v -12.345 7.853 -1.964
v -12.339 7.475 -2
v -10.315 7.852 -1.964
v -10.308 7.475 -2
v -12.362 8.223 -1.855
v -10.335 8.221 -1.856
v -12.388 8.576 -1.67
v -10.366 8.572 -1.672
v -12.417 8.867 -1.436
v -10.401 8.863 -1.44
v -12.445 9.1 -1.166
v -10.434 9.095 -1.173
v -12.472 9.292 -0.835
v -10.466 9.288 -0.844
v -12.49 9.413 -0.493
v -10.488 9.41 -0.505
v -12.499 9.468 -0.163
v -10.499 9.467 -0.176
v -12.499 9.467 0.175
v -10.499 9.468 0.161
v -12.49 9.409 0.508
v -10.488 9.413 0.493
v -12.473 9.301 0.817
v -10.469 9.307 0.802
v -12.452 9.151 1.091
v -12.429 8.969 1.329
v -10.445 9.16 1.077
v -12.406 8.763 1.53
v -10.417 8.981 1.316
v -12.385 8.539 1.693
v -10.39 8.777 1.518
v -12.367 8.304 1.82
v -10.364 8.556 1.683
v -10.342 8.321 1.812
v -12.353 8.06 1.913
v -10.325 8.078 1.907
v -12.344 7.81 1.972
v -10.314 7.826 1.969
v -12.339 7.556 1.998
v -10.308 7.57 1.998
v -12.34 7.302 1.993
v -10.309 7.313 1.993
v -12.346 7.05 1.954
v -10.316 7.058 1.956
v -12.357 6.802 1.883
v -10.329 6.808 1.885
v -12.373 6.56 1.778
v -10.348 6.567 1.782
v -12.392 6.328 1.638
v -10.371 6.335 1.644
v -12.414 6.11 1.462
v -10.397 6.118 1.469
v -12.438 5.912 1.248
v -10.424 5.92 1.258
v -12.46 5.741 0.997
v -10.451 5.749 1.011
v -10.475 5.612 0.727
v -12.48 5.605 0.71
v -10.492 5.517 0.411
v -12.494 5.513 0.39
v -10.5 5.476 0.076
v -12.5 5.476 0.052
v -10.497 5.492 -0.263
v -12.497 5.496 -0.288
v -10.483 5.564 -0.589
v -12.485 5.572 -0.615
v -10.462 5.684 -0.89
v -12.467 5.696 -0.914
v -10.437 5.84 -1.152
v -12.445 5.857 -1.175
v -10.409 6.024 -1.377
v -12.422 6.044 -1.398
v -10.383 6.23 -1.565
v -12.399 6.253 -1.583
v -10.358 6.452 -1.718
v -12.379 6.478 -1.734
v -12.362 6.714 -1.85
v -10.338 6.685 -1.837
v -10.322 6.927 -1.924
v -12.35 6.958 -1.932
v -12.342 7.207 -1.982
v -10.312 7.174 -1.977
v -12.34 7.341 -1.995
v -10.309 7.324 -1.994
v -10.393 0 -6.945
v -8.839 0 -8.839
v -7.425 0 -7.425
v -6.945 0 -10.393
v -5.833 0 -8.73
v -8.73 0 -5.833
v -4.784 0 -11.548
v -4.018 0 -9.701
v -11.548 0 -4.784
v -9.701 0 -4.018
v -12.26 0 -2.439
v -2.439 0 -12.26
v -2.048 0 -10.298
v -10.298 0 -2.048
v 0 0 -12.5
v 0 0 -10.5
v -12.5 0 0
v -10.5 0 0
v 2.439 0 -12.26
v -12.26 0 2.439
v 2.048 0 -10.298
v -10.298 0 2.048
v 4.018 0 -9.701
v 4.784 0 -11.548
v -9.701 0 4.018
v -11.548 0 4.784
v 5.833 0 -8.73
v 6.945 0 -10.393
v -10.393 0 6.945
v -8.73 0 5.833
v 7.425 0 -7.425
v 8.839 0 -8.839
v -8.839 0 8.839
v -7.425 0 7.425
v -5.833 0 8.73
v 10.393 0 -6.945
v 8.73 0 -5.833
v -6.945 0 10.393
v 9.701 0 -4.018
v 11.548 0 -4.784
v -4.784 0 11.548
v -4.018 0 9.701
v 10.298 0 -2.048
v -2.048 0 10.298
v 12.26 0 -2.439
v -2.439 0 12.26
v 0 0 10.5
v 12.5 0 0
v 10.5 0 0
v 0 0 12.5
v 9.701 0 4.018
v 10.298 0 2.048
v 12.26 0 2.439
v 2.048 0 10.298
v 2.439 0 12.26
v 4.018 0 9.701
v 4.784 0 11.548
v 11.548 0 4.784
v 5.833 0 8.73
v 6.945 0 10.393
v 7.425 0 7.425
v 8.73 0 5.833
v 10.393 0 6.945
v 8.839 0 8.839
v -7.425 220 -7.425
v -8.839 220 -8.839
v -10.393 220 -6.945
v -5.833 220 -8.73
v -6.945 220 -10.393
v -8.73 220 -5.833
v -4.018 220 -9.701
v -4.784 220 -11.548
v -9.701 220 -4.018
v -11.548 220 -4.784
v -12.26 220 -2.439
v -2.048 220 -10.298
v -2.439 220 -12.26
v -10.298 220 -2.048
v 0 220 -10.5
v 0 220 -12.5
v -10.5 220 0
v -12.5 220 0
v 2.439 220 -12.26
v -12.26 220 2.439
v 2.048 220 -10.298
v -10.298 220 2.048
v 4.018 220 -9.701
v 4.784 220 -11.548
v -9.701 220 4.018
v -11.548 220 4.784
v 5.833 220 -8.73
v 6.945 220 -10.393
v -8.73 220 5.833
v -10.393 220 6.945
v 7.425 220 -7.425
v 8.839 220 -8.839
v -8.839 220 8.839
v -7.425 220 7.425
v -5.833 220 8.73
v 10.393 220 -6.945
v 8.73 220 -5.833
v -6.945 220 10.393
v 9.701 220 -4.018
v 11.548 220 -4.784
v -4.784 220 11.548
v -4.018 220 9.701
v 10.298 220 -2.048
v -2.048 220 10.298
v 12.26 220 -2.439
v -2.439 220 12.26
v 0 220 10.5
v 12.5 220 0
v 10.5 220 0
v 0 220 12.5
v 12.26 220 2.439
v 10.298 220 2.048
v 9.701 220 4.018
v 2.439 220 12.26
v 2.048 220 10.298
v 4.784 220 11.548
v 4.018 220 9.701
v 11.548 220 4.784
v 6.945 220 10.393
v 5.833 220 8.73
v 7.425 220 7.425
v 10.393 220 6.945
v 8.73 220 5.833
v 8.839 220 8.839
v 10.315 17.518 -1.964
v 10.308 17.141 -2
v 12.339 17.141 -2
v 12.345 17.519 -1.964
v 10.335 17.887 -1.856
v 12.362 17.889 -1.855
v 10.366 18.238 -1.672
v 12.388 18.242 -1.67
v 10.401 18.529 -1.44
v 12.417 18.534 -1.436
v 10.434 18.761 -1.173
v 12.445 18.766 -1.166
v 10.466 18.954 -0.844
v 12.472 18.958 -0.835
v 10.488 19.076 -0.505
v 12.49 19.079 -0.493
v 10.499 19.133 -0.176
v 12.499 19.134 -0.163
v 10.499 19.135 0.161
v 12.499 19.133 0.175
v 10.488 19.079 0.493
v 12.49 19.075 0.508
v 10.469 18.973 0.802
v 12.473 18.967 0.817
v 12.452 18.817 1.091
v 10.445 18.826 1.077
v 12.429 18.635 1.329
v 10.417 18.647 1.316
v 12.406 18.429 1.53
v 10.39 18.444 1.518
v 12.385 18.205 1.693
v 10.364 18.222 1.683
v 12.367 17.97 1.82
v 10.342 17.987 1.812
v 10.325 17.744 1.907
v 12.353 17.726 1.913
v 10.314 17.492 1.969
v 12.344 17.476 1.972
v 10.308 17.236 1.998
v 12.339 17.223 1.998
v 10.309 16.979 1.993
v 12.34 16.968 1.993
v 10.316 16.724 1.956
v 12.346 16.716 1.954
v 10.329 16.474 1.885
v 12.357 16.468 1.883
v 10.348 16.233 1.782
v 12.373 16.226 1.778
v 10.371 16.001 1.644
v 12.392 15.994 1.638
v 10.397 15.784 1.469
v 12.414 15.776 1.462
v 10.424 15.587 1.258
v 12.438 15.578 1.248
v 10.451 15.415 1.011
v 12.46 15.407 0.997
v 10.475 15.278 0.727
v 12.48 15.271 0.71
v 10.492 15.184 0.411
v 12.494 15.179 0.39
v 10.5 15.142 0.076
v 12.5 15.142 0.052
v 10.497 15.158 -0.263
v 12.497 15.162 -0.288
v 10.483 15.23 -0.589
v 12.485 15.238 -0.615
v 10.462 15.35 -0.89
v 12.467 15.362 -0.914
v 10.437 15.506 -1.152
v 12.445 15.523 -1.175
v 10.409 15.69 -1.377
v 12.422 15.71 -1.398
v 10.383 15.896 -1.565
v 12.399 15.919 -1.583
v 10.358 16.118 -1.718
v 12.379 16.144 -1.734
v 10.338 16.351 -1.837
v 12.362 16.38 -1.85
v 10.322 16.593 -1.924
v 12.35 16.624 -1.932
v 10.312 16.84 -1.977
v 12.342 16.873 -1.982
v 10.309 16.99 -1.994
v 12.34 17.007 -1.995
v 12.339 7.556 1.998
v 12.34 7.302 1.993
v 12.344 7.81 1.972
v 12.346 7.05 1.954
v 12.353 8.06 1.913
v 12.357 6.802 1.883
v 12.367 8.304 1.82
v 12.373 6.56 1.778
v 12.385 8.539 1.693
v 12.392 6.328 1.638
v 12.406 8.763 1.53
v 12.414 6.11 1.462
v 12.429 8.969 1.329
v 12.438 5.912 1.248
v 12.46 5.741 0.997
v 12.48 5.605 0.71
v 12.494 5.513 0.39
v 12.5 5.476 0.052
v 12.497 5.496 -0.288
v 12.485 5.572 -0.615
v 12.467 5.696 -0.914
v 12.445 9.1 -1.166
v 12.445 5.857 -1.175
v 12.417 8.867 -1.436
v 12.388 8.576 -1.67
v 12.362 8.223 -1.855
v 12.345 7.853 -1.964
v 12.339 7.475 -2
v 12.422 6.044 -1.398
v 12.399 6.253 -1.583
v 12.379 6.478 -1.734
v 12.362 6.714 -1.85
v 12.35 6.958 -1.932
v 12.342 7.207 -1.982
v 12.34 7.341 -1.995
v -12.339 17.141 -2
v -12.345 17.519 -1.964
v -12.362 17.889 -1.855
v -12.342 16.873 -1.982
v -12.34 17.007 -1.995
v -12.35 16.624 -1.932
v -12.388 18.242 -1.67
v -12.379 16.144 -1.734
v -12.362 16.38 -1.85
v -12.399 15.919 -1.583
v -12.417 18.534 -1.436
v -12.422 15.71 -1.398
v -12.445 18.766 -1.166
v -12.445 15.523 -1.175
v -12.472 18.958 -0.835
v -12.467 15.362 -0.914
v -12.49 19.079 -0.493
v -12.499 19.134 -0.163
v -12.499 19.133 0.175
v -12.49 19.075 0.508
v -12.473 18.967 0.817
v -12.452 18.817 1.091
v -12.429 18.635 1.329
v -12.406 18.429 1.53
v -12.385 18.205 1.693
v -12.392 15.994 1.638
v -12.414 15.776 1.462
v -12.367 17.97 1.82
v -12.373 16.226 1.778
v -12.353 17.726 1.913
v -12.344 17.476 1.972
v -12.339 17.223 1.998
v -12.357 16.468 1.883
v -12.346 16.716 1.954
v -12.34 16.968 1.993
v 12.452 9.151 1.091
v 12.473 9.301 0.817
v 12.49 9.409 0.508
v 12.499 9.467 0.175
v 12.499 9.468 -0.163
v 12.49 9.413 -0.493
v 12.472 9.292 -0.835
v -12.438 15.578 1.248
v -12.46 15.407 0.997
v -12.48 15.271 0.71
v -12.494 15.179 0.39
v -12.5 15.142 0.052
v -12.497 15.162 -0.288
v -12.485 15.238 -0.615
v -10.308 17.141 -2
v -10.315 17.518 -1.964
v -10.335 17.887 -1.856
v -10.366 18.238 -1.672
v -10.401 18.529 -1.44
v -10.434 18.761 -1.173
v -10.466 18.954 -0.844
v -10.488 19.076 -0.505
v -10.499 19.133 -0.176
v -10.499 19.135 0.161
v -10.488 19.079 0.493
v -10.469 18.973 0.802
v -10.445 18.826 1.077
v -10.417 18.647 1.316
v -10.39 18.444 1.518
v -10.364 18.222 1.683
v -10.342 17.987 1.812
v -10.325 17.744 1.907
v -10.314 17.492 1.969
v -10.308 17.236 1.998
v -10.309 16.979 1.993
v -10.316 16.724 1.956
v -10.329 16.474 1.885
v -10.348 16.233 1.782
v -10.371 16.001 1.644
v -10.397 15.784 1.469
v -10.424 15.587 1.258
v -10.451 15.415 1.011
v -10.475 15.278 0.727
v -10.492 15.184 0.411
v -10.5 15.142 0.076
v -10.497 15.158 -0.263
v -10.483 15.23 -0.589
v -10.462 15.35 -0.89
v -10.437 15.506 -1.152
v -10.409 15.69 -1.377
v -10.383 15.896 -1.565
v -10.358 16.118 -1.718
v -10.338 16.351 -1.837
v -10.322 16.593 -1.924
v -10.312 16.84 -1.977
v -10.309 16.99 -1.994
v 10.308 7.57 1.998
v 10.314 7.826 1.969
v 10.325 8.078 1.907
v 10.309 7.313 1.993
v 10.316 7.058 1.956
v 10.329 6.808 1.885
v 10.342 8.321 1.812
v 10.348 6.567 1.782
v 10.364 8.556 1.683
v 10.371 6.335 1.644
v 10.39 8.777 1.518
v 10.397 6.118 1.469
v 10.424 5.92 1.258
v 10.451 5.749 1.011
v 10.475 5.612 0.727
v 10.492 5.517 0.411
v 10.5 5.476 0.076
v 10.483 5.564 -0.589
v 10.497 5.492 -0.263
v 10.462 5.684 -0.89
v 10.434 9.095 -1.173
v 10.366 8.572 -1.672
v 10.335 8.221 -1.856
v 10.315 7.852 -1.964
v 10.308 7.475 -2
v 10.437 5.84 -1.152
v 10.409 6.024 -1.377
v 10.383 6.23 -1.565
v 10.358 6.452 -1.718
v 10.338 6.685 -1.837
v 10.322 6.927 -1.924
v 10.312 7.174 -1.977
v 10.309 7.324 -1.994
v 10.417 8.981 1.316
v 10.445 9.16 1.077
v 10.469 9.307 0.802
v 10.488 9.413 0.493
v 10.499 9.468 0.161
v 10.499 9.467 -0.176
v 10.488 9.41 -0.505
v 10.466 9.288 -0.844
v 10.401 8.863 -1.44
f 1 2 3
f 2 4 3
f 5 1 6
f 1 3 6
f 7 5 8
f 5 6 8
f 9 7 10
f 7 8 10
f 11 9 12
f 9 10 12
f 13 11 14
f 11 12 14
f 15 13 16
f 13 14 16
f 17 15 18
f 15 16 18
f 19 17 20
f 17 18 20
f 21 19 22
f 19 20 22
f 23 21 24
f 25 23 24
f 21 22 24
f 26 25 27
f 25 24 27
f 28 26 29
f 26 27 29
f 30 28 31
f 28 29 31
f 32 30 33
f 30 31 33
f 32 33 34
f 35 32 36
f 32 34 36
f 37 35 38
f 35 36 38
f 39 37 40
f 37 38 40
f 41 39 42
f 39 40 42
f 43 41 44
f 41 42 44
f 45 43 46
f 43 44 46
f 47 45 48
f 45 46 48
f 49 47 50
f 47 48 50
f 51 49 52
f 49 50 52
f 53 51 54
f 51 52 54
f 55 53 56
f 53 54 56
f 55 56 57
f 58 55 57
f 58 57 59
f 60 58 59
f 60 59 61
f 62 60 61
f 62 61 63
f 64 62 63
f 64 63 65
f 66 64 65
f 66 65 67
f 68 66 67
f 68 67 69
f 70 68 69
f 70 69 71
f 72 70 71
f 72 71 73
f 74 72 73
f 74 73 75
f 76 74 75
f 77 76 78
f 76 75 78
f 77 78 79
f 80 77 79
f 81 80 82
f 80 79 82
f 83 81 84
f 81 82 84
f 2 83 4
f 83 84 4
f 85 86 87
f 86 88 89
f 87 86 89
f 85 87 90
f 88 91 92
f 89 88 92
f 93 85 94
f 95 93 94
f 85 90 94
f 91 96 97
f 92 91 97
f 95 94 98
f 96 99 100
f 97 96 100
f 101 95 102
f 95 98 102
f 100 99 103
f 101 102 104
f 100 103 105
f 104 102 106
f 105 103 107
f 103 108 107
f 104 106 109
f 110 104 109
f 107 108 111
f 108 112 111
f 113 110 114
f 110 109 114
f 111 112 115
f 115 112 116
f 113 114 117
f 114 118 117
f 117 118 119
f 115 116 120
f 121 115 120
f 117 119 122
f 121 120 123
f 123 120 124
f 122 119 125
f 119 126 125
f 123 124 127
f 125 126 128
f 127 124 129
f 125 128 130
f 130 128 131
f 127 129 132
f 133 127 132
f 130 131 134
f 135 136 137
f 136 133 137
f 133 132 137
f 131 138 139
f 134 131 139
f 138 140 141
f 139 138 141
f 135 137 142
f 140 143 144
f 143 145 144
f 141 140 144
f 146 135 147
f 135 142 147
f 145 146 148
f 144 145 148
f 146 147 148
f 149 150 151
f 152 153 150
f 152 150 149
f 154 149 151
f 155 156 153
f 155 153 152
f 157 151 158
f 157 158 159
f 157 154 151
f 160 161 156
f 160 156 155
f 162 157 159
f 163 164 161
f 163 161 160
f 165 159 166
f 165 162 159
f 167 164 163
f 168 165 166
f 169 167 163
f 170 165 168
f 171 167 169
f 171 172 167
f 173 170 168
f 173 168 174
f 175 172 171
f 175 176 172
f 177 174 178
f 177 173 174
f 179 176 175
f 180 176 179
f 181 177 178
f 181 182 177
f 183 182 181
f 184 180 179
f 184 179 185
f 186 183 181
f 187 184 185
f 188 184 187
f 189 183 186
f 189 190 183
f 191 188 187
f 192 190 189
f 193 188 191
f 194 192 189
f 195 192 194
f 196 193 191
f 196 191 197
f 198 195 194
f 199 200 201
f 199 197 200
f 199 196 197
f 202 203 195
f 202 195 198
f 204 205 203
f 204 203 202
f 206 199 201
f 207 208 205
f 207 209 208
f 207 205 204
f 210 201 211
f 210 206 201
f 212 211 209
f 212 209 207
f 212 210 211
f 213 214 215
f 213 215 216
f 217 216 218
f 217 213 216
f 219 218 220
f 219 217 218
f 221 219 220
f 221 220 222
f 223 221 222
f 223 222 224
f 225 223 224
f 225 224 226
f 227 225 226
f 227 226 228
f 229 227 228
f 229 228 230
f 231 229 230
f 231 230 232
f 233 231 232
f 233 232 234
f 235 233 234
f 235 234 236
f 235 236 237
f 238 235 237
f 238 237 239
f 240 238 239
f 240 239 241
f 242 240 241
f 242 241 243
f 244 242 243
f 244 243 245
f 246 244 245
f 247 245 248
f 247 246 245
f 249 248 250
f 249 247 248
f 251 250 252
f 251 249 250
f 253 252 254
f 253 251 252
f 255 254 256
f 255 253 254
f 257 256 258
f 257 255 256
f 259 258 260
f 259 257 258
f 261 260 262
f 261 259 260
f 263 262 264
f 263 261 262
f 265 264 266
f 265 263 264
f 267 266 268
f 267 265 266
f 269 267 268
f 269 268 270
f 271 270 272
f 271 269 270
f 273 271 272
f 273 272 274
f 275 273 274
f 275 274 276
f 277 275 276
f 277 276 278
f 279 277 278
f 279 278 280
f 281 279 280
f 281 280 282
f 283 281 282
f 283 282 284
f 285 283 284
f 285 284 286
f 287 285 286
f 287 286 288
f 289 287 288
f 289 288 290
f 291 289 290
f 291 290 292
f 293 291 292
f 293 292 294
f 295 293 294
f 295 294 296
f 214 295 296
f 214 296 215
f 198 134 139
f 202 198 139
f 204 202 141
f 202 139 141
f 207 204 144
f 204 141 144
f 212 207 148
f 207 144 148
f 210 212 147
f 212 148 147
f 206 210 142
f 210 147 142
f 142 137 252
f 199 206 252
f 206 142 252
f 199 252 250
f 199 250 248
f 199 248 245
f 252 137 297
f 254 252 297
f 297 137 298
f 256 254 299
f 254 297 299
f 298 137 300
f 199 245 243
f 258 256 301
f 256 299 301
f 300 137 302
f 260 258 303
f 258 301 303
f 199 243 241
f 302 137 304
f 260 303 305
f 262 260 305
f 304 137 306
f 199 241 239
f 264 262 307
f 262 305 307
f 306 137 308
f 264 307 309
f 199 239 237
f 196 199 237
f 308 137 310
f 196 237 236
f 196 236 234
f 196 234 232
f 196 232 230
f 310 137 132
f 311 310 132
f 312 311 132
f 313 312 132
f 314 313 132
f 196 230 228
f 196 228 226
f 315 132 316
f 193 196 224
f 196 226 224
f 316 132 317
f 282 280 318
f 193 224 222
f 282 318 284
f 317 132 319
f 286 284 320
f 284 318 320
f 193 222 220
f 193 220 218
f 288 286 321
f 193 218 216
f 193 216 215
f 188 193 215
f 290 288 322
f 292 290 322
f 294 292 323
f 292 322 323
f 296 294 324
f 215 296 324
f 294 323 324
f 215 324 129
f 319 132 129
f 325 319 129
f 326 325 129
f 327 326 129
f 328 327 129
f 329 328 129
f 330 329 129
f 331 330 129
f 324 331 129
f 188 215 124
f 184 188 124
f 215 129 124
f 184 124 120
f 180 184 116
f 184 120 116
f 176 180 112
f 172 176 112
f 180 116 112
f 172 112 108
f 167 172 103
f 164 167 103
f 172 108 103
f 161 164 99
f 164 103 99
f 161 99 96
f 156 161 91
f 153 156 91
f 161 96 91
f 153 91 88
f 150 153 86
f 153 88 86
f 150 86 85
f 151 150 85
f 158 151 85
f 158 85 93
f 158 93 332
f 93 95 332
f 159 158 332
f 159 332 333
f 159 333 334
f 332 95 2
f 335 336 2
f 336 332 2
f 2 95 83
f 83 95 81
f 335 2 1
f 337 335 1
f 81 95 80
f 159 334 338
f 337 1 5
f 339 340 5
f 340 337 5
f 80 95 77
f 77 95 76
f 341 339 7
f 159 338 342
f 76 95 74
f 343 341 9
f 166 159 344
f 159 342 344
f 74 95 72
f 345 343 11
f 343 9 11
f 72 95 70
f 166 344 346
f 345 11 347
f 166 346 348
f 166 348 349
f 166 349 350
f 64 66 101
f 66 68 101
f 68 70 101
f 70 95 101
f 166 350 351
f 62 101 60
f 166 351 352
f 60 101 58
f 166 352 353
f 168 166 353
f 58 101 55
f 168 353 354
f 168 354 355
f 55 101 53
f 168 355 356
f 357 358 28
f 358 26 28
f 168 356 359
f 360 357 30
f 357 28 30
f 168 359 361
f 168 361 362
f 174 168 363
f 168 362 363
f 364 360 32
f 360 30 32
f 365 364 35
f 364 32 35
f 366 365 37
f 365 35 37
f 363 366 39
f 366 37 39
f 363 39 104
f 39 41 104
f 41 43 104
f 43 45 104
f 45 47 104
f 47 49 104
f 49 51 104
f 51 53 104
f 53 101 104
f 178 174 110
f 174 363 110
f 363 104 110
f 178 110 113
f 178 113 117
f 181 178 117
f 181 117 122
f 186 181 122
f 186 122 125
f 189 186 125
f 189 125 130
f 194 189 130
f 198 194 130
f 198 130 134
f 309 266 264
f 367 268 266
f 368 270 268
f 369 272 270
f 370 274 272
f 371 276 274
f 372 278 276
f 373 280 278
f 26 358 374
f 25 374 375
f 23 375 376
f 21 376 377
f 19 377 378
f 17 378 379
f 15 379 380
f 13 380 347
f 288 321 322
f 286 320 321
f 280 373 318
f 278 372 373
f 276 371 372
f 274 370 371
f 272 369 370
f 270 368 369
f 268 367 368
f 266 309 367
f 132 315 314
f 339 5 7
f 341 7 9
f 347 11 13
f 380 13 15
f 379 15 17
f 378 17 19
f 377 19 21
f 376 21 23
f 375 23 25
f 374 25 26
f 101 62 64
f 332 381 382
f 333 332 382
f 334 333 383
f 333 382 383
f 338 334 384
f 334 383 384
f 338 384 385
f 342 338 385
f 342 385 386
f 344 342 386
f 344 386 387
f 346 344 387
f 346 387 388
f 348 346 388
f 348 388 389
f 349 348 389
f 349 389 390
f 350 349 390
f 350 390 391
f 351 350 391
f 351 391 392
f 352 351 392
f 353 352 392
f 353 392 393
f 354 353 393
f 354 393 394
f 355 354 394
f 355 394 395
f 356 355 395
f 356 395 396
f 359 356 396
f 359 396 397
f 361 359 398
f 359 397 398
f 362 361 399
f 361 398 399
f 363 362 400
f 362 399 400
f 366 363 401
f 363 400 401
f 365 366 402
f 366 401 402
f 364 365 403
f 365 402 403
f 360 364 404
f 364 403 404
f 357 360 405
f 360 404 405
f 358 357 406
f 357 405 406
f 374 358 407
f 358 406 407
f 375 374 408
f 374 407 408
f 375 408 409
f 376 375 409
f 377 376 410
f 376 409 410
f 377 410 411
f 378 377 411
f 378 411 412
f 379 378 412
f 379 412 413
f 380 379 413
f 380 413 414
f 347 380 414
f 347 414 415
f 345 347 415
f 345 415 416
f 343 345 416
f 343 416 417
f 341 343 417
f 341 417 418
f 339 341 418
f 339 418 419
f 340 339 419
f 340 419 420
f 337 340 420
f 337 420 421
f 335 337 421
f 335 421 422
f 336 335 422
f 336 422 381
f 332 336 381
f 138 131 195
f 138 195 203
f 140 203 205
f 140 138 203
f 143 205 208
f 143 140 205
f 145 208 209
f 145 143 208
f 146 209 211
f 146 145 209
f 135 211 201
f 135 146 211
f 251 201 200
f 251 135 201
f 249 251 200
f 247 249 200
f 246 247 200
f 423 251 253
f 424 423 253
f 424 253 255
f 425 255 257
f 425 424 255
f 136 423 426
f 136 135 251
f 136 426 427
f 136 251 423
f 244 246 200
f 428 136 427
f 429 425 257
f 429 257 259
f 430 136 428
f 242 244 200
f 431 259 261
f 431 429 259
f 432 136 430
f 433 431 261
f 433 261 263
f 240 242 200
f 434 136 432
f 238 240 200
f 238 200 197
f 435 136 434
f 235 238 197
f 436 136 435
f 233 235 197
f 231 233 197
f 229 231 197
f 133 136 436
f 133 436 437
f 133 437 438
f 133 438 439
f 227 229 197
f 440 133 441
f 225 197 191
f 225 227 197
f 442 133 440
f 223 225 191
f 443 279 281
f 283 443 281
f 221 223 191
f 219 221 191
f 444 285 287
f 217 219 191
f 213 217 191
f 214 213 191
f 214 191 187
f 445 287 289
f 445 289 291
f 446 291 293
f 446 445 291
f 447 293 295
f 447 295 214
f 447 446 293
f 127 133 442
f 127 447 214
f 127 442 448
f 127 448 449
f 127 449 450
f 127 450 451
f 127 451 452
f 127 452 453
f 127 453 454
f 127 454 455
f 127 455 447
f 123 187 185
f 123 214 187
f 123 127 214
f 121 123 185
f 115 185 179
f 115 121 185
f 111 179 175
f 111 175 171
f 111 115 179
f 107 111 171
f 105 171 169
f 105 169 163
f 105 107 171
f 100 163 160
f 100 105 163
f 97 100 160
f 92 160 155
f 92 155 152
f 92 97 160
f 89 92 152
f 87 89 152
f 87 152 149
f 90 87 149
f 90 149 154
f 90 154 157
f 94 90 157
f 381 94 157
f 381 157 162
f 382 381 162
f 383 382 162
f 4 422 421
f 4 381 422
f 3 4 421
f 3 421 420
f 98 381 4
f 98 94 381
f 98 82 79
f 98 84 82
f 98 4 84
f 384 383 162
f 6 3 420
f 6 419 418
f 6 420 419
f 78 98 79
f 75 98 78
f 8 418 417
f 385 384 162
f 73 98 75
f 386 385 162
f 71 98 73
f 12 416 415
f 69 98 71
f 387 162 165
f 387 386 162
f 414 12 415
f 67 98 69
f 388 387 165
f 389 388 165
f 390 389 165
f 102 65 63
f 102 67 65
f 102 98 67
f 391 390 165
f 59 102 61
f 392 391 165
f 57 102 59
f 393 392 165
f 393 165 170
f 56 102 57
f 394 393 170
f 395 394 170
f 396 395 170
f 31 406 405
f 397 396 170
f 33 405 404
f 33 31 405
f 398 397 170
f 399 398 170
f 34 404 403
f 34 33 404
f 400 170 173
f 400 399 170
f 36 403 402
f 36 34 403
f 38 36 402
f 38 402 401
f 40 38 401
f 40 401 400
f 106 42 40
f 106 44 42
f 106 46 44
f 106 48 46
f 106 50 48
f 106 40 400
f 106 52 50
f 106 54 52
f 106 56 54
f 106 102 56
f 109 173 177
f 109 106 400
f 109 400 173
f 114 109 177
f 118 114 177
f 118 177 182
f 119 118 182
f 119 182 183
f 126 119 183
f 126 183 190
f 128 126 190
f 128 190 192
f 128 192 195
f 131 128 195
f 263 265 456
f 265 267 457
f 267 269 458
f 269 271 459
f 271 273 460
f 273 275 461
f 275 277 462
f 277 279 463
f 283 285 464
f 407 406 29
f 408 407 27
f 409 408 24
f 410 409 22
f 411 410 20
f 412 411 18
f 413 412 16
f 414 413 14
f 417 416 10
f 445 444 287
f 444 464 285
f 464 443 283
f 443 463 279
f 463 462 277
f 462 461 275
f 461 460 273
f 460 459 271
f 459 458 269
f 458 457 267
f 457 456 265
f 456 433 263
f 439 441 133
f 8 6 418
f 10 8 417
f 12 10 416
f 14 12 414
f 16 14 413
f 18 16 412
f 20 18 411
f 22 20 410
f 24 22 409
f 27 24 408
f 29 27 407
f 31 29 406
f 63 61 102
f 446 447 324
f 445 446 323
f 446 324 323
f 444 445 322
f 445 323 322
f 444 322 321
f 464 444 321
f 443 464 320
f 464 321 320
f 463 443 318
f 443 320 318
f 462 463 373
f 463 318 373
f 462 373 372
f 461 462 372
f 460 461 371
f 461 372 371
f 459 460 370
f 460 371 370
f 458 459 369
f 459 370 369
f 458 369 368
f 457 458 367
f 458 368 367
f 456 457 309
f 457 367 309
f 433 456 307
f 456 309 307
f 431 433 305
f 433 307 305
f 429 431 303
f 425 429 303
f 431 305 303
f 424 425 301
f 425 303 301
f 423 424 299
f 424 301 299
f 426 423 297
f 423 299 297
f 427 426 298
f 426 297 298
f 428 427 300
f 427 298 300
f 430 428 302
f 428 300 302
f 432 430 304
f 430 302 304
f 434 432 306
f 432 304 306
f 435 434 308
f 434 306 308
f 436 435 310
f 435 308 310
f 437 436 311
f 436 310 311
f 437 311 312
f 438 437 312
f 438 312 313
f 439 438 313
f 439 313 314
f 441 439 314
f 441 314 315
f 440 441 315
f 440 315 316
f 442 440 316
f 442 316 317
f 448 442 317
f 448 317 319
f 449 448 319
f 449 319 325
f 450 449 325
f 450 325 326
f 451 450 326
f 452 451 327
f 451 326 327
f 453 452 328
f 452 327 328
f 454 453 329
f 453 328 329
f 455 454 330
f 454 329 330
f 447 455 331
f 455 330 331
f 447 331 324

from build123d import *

# Parameters (mm, degrees)
SKETCH_1_R          = 12.5
SKETCH_1_R_2        = 10.5
EXTRUDE_1_DEPTH     = 220
SKETCH_4_R          = 2
CUT_EXTRUDE_1_DEPTH = 100


with BuildPart() as part:
    # Эскиз1 → Вытянуть1 (new body)
    with BuildSketch(Plane(origin=(0, 0, 0), x_dir=(1, 0, 0), z_dir=(0, 1, 0))):
        with Locations(Location((0, 0, 0), (0, 0, 270))):
            Circle(SKETCH_1_R)
        with Locations(Location((0, 0, 0), (0, 0, 270))):
            Circle(SKETCH_1_R_2, mode=Mode.SUBTRACT)
    extrude(amount=EXTRUDE_1_DEPTH)

    # Эскиз4 → Вырез-Вытянуть1 (cut, symmetric)
    with BuildSketch(Plane(origin=(0, 0, 0), x_dir=(0, 0, -1), z_dir=(1, 0, 0))):
        with Locations((0, 17.141022055)):
            Circle(SKETCH_4_R)
        with Locations((0, 7.474896081)):
            Circle(SKETCH_4_R)
    extrude(amount=CUT_EXTRUDE_1_DEPTH, both=True, mode=Mode.SUBTRACT)


solid = part.part
